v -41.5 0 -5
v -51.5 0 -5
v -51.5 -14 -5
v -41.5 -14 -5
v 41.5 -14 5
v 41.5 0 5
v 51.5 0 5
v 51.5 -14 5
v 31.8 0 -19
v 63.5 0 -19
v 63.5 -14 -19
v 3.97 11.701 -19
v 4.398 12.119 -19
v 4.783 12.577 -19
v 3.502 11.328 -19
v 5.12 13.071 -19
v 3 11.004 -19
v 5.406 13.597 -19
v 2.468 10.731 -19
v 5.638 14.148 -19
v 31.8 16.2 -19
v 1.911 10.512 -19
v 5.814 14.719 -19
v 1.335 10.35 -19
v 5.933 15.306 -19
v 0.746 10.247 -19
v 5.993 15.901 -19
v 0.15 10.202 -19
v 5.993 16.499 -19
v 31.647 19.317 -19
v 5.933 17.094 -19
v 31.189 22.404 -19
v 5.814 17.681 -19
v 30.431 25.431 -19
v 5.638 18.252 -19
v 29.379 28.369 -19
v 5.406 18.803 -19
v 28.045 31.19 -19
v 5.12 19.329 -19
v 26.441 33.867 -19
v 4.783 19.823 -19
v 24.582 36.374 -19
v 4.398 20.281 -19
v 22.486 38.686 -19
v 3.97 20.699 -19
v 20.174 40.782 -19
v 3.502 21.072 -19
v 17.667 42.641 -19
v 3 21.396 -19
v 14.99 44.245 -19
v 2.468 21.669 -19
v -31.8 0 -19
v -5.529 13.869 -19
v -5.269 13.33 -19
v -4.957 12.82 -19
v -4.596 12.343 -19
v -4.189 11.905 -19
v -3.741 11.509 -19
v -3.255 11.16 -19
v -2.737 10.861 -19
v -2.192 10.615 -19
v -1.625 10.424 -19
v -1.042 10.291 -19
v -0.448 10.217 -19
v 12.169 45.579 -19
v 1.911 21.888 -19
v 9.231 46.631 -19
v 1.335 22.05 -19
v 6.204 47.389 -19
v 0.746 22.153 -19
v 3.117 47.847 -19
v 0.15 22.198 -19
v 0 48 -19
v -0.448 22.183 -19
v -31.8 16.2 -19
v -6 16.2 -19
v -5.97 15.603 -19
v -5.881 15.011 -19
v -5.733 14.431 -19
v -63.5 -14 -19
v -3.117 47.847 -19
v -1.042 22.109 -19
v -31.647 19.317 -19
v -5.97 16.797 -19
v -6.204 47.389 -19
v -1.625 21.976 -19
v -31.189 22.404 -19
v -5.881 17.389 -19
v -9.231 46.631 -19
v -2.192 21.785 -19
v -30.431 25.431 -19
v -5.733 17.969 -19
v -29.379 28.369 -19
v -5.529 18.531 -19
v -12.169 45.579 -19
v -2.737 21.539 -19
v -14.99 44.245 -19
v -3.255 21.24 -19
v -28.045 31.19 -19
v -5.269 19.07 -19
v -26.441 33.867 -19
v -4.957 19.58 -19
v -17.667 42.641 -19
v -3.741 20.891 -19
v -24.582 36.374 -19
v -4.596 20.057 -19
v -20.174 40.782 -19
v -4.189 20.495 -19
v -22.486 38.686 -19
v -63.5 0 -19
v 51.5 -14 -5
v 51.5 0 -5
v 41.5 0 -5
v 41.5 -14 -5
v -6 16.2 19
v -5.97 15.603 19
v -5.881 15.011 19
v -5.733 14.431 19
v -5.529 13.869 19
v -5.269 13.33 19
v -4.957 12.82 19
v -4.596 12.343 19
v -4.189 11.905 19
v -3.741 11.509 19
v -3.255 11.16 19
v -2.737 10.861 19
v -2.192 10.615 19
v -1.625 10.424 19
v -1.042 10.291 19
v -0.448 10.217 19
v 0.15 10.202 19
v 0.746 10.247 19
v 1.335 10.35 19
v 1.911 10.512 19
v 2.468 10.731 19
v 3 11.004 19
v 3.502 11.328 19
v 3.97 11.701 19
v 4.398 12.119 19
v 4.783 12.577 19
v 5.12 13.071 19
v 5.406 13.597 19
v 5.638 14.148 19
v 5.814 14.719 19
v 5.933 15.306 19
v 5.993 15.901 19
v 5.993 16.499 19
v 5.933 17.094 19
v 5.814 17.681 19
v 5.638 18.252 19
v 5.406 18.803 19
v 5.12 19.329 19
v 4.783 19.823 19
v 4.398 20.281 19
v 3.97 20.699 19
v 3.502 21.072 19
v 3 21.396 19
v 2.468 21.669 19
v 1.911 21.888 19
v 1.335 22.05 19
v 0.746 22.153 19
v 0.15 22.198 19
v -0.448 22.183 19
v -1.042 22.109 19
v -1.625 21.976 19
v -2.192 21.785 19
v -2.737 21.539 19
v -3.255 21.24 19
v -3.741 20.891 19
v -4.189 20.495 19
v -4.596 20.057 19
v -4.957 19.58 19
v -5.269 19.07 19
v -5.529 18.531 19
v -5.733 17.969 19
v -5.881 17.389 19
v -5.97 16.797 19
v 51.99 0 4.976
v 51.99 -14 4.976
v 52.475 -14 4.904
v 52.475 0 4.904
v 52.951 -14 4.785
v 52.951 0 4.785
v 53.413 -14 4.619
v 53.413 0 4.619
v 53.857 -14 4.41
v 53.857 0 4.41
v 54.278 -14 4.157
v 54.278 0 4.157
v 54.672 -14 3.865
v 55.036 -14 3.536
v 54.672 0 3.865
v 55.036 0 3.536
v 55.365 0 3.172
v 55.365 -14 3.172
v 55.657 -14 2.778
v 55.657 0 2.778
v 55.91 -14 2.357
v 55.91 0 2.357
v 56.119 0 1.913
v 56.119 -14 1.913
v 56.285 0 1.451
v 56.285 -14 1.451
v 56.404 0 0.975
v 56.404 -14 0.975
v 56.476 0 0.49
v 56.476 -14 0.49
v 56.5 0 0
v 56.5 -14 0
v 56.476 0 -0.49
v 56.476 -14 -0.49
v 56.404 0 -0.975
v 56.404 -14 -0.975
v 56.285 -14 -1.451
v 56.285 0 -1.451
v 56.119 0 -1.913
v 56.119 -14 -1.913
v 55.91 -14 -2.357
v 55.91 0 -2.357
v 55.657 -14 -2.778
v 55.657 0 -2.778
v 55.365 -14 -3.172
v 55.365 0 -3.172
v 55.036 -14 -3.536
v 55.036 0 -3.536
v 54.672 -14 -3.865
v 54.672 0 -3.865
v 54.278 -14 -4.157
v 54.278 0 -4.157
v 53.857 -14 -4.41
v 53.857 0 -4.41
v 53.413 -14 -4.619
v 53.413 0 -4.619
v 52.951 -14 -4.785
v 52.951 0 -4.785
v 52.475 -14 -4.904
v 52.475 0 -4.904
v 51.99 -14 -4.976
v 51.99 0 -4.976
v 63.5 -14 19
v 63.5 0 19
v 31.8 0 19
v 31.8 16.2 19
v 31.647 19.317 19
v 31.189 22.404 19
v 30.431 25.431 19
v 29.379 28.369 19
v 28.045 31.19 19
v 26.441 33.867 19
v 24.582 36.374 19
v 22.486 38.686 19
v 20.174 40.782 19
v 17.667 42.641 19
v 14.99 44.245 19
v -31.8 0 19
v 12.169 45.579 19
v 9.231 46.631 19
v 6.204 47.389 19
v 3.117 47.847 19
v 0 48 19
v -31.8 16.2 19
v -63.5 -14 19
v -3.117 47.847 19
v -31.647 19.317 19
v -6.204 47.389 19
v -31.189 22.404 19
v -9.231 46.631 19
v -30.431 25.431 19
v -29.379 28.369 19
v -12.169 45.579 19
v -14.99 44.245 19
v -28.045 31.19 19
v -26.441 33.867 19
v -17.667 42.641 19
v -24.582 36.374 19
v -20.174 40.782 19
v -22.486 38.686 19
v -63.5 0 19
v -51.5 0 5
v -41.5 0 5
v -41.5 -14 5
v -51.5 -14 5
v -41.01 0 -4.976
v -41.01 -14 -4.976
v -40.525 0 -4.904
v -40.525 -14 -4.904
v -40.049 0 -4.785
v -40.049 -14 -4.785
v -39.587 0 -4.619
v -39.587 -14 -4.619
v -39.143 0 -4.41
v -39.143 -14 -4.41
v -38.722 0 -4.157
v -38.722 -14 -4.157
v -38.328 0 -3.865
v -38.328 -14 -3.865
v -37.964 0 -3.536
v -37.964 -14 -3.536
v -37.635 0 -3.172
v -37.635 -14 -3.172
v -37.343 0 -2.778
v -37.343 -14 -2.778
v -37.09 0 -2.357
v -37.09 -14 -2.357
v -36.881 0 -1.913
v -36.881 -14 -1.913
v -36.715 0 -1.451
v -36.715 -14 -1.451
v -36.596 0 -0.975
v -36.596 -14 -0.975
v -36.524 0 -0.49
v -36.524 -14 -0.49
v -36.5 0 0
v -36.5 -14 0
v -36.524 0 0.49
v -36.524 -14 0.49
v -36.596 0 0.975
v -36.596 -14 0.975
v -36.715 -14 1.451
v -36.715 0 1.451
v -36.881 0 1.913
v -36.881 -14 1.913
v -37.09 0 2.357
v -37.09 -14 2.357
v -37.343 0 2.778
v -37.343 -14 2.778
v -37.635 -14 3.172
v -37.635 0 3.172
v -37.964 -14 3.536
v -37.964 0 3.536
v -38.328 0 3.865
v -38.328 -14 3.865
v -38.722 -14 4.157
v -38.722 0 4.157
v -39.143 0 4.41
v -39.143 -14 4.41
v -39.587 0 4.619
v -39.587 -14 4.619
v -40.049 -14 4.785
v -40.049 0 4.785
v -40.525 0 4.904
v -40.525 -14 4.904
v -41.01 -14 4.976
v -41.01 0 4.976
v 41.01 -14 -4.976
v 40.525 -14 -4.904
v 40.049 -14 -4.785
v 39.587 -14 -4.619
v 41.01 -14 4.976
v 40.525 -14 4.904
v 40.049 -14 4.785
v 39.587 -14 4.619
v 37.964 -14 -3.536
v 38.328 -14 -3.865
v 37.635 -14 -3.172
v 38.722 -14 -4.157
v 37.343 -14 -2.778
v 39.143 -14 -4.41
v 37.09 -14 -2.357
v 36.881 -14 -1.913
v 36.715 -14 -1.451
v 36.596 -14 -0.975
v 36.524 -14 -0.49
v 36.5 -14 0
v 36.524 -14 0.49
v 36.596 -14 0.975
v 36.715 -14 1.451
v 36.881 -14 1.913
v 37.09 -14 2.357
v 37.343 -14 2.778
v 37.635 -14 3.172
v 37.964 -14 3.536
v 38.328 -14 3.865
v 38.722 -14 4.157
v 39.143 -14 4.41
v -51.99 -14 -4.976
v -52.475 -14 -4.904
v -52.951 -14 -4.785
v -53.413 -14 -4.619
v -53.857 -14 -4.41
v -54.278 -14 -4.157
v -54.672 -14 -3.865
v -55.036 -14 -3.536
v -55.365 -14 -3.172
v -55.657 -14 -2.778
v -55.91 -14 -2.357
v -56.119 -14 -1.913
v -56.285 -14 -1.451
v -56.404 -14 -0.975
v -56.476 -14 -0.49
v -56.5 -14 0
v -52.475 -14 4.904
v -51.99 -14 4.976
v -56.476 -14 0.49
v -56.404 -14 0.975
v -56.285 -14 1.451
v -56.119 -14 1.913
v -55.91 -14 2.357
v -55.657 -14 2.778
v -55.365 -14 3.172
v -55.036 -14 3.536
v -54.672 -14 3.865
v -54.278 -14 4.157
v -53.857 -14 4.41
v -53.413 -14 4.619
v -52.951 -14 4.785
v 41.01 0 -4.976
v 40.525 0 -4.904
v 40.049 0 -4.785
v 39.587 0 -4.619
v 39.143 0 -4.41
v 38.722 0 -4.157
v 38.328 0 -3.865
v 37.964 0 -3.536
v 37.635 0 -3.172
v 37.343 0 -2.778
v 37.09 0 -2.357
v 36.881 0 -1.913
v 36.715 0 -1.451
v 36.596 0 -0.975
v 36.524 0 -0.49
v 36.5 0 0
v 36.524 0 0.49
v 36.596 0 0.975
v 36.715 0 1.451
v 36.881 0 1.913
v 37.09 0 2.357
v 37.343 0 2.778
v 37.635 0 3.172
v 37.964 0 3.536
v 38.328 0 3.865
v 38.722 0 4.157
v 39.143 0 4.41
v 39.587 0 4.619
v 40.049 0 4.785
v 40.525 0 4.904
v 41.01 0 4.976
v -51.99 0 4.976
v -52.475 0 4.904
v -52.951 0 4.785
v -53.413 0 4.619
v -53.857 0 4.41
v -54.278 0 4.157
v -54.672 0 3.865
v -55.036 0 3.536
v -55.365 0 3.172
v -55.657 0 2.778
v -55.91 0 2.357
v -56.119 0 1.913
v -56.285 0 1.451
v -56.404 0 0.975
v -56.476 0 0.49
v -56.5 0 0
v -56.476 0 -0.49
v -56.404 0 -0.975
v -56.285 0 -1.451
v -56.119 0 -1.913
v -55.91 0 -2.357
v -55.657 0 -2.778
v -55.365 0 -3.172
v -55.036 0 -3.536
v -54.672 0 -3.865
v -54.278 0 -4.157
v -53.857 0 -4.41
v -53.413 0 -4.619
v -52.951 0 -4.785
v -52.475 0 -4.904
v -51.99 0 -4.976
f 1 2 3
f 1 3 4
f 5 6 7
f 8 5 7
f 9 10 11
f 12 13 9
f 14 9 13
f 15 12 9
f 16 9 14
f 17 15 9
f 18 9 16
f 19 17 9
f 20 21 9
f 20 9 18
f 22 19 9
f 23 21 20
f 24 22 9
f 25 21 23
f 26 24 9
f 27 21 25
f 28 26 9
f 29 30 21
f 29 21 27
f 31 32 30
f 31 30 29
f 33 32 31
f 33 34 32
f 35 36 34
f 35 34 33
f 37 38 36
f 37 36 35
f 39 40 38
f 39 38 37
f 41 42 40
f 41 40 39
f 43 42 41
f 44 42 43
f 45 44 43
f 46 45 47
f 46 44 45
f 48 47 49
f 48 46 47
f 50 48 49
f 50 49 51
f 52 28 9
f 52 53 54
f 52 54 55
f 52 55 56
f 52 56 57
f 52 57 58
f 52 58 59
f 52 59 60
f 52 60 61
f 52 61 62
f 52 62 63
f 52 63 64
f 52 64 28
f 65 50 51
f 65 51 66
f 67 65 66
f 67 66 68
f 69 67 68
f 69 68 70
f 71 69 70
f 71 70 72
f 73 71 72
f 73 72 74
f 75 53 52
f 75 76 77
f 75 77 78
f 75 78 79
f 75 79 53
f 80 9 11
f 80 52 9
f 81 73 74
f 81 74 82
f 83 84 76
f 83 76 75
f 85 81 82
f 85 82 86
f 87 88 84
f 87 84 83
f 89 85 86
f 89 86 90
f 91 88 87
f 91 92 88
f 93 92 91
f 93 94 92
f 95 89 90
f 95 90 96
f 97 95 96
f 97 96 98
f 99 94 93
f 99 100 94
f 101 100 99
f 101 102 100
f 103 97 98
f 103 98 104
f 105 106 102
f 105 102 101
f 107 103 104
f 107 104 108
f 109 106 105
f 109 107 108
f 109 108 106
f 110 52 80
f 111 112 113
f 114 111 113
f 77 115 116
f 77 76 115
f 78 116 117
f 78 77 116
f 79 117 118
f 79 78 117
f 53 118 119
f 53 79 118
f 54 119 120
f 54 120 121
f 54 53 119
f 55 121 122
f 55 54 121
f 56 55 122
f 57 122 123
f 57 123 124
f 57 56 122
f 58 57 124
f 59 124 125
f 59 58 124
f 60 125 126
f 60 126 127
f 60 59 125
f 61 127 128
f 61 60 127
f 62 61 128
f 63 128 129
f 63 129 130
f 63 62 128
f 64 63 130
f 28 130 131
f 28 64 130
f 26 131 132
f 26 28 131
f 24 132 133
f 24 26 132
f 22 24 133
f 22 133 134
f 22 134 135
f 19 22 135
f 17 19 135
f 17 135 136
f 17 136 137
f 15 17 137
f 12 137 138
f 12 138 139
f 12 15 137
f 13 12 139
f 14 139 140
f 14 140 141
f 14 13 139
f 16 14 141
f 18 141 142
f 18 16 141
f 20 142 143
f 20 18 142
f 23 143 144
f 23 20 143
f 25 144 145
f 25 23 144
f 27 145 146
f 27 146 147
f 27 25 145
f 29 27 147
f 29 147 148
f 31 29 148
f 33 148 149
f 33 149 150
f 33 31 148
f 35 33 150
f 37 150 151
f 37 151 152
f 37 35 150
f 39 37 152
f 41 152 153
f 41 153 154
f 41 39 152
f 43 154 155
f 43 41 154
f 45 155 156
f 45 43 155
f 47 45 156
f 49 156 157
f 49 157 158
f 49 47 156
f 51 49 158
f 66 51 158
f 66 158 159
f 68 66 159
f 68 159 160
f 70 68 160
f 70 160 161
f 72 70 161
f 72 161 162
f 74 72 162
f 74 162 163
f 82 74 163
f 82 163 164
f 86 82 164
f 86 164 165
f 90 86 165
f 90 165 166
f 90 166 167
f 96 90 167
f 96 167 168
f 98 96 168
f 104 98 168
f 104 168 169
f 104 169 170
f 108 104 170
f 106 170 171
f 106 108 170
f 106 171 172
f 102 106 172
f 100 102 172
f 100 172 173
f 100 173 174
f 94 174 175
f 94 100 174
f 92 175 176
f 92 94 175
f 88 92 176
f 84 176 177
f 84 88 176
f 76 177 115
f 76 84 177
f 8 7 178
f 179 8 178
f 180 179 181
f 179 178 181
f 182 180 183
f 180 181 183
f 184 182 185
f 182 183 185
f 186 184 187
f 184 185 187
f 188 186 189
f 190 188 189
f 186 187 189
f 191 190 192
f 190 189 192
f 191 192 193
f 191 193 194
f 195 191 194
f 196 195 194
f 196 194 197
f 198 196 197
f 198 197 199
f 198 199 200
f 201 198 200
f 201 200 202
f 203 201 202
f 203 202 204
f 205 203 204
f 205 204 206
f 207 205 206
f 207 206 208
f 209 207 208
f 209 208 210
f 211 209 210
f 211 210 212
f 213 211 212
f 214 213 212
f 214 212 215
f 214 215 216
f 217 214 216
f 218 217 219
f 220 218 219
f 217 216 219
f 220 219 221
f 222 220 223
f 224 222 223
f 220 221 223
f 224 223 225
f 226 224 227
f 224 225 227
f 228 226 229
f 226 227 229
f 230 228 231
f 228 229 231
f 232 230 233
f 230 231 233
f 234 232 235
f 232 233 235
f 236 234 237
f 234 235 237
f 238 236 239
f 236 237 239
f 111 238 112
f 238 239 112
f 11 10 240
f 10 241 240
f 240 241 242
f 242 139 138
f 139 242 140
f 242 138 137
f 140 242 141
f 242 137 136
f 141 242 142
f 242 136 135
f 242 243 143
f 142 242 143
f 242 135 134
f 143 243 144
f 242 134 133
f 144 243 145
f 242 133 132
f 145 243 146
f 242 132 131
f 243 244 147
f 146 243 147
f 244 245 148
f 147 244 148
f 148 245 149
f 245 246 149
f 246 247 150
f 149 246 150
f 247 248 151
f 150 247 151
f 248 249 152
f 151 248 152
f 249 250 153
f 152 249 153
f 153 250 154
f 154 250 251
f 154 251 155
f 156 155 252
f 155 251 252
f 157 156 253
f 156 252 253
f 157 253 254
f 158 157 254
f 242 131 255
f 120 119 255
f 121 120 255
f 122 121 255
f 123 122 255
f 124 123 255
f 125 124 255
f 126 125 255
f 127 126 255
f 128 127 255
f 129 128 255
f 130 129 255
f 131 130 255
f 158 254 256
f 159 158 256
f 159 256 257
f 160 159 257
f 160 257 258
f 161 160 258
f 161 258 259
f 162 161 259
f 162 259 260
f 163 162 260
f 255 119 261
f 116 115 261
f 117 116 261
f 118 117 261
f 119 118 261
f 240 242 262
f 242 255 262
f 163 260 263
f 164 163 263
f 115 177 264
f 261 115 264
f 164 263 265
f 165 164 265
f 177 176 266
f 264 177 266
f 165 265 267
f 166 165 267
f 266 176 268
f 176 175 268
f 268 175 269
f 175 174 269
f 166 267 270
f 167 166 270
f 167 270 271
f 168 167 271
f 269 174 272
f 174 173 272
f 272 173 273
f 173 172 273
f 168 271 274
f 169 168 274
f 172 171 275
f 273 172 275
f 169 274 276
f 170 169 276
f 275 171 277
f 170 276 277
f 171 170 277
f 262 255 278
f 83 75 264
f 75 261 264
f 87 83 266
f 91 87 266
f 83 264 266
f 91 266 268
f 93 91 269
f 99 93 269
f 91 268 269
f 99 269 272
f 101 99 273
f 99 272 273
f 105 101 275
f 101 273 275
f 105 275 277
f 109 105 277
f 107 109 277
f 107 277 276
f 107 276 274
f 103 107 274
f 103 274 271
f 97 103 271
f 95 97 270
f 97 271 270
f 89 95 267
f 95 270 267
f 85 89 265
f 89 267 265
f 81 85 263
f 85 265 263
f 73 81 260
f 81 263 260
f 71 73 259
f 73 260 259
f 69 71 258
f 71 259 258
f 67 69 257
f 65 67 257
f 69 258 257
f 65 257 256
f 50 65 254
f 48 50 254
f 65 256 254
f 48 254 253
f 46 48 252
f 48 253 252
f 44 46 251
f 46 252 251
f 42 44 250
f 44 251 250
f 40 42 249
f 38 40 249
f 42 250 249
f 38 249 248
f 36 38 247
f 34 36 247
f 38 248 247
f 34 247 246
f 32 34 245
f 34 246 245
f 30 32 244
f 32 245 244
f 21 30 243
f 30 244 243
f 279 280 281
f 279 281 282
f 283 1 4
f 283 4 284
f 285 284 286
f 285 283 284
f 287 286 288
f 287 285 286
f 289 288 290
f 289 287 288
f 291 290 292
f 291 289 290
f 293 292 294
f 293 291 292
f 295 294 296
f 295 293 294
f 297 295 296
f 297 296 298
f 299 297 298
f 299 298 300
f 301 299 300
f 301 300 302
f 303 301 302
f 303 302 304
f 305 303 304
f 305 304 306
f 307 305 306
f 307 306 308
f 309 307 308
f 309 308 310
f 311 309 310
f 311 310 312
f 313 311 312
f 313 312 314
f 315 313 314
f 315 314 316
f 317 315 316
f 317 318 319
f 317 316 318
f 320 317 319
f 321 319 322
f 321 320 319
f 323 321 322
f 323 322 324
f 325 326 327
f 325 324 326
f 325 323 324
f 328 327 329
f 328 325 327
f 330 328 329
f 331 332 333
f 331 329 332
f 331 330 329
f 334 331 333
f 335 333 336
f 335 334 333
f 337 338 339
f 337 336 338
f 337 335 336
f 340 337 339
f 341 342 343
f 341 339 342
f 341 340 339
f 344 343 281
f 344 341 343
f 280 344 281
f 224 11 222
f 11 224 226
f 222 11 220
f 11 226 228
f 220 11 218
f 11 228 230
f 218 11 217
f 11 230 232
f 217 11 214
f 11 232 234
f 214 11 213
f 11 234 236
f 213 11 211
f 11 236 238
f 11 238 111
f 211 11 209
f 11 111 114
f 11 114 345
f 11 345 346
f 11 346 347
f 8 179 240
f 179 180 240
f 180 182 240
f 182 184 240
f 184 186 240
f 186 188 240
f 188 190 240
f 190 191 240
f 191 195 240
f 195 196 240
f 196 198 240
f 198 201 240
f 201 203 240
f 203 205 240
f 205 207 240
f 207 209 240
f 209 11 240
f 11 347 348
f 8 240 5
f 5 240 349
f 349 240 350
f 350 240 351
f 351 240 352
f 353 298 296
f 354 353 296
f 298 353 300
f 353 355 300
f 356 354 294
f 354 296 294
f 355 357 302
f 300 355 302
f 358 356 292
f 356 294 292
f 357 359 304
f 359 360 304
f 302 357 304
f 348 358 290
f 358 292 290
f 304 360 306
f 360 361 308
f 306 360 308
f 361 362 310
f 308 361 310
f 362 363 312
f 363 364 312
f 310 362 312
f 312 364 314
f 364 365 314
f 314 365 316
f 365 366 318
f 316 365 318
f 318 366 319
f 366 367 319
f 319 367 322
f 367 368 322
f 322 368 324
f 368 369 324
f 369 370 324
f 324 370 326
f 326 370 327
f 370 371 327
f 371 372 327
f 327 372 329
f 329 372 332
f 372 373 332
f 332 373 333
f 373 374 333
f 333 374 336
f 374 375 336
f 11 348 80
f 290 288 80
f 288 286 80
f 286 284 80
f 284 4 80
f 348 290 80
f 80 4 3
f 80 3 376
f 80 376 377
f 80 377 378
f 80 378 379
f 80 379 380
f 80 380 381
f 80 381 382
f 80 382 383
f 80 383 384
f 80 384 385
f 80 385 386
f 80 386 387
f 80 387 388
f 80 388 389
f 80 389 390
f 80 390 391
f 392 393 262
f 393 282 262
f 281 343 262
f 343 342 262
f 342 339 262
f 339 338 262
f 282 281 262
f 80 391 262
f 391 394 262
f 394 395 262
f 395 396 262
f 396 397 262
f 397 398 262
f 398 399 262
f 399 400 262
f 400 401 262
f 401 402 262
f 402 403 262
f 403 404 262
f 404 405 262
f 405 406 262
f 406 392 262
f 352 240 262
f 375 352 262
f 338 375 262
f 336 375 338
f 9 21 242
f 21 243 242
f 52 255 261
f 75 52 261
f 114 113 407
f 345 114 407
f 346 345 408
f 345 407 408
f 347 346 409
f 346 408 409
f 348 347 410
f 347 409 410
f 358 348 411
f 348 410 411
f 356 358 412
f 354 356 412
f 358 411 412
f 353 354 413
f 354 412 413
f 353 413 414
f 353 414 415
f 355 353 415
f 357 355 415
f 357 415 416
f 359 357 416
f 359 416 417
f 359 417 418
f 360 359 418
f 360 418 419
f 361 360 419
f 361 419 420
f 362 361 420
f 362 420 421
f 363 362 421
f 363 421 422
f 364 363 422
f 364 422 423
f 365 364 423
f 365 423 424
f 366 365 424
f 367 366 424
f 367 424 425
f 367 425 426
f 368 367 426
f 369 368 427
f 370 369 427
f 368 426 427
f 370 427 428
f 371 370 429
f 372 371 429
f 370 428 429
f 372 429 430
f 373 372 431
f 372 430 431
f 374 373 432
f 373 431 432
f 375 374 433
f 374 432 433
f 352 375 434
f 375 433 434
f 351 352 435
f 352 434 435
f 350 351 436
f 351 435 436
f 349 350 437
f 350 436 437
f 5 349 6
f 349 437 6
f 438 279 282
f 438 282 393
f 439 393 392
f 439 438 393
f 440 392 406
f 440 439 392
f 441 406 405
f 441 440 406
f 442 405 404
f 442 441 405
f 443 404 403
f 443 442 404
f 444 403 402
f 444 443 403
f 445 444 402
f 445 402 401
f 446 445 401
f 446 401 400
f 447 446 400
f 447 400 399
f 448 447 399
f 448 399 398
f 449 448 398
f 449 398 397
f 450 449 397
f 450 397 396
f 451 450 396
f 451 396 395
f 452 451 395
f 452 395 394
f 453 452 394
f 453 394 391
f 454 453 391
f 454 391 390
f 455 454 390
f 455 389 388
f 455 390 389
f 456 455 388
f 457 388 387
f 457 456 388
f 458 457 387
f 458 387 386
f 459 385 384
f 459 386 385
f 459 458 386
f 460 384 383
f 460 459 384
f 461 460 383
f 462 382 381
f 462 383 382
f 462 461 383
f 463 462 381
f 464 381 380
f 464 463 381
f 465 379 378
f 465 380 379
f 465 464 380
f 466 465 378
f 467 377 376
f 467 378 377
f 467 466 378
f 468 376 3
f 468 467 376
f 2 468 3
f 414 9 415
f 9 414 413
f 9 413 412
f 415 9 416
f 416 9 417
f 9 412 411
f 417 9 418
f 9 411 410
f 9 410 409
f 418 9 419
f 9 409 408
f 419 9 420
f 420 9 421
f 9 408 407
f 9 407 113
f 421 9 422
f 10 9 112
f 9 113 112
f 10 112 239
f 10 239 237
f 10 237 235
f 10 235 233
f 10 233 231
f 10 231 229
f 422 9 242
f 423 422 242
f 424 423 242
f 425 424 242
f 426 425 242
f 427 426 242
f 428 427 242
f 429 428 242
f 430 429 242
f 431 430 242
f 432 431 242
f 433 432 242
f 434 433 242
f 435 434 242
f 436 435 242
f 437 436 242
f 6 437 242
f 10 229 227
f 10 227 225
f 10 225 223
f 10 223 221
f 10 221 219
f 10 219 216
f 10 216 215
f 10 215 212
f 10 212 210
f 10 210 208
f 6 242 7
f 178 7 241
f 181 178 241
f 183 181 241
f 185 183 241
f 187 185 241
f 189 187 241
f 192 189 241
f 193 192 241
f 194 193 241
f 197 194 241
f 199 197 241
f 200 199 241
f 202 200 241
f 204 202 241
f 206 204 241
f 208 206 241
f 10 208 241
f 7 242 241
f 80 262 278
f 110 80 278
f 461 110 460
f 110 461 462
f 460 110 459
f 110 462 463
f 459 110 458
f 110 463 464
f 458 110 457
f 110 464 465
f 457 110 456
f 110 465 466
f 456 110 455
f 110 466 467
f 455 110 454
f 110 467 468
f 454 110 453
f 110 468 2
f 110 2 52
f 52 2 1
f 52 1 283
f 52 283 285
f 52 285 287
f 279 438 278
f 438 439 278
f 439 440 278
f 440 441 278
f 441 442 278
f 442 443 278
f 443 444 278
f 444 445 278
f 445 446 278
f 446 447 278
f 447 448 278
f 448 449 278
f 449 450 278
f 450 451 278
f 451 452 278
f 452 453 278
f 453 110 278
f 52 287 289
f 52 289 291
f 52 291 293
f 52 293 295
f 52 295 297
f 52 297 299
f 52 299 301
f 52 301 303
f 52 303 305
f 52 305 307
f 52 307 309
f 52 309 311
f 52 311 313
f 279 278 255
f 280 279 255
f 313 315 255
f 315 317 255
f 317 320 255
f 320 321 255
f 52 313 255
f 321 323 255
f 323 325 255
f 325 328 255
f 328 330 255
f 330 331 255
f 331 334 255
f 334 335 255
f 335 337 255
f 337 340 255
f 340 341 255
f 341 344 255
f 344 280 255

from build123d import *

# Parameters (mm, degrees)
SKETCH_1_R          = 6
EXTRUDE_1_DEPTH     = 19
CUT_EXTRUDE_1_DEPTH = 82.836727696


with BuildPart() as part:
    # Эскиз1 → Бобышка-Вытянуть1 (new, symmetric)
    with BuildSketch(Plane.XY):
        with BuildLine():
            Line((-31.8, 0), (-31.8, 16.2))
            ThreePointArc((-31.8, 16.2), (0, 48), (31.8, 16.2))
            Line((31.8, 16.2), (31.8, 0))
            Line((31.8, 0), (63.5, 0))
            Line((63.5, 0), (63.5, -14))
            Line((63.5, -14), (-63.5, -14))
            Line((-63.5, -14), (-63.5, 0))
            Line((-63.5, 0), (-31.8, 0))
        make_face()
        with Locations(Location((0, 16.2, 0), (0, 0, 180))):
            Circle(SKETCH_1_R, mode=Mode.SUBTRACT)
    extrude(amount=EXTRUDE_1_DEPTH, both=True)

    # Эскиз2 → Вырез-Вытянуть1 (cut, through all)
    with BuildSketch(Plane(origin=(0, 0, 0), x_dir=(1, 0, 0), z_dir=(0, 1, 0))):
        with BuildLine():
            Line((-51.5, 5), (-41.5, 5))
            ThreePointArc((-41.5, 5), (-36.5, 0), (-41.5, -5))
            Line((-41.5, -5), (-51.5, -5))
            ThreePointArc((-51.5, -5), (-56.5, 0), (-51.5, 5))
        make_face()
        with BuildLine():
            Line((51.5, 5), (41.5, 5))
            ThreePointArc((41.5, 5), (36.5, 0), (41.5, -5))
            Line((41.5, -5), (51.5, -5))
            ThreePointArc((51.5, -5), (56.5, 0), (51.5, 5))
        make_face()
    extrude(amount=-CUT_EXTRUDE_1_DEPTH, mode=Mode.SUBTRACT)


solid = part.part
